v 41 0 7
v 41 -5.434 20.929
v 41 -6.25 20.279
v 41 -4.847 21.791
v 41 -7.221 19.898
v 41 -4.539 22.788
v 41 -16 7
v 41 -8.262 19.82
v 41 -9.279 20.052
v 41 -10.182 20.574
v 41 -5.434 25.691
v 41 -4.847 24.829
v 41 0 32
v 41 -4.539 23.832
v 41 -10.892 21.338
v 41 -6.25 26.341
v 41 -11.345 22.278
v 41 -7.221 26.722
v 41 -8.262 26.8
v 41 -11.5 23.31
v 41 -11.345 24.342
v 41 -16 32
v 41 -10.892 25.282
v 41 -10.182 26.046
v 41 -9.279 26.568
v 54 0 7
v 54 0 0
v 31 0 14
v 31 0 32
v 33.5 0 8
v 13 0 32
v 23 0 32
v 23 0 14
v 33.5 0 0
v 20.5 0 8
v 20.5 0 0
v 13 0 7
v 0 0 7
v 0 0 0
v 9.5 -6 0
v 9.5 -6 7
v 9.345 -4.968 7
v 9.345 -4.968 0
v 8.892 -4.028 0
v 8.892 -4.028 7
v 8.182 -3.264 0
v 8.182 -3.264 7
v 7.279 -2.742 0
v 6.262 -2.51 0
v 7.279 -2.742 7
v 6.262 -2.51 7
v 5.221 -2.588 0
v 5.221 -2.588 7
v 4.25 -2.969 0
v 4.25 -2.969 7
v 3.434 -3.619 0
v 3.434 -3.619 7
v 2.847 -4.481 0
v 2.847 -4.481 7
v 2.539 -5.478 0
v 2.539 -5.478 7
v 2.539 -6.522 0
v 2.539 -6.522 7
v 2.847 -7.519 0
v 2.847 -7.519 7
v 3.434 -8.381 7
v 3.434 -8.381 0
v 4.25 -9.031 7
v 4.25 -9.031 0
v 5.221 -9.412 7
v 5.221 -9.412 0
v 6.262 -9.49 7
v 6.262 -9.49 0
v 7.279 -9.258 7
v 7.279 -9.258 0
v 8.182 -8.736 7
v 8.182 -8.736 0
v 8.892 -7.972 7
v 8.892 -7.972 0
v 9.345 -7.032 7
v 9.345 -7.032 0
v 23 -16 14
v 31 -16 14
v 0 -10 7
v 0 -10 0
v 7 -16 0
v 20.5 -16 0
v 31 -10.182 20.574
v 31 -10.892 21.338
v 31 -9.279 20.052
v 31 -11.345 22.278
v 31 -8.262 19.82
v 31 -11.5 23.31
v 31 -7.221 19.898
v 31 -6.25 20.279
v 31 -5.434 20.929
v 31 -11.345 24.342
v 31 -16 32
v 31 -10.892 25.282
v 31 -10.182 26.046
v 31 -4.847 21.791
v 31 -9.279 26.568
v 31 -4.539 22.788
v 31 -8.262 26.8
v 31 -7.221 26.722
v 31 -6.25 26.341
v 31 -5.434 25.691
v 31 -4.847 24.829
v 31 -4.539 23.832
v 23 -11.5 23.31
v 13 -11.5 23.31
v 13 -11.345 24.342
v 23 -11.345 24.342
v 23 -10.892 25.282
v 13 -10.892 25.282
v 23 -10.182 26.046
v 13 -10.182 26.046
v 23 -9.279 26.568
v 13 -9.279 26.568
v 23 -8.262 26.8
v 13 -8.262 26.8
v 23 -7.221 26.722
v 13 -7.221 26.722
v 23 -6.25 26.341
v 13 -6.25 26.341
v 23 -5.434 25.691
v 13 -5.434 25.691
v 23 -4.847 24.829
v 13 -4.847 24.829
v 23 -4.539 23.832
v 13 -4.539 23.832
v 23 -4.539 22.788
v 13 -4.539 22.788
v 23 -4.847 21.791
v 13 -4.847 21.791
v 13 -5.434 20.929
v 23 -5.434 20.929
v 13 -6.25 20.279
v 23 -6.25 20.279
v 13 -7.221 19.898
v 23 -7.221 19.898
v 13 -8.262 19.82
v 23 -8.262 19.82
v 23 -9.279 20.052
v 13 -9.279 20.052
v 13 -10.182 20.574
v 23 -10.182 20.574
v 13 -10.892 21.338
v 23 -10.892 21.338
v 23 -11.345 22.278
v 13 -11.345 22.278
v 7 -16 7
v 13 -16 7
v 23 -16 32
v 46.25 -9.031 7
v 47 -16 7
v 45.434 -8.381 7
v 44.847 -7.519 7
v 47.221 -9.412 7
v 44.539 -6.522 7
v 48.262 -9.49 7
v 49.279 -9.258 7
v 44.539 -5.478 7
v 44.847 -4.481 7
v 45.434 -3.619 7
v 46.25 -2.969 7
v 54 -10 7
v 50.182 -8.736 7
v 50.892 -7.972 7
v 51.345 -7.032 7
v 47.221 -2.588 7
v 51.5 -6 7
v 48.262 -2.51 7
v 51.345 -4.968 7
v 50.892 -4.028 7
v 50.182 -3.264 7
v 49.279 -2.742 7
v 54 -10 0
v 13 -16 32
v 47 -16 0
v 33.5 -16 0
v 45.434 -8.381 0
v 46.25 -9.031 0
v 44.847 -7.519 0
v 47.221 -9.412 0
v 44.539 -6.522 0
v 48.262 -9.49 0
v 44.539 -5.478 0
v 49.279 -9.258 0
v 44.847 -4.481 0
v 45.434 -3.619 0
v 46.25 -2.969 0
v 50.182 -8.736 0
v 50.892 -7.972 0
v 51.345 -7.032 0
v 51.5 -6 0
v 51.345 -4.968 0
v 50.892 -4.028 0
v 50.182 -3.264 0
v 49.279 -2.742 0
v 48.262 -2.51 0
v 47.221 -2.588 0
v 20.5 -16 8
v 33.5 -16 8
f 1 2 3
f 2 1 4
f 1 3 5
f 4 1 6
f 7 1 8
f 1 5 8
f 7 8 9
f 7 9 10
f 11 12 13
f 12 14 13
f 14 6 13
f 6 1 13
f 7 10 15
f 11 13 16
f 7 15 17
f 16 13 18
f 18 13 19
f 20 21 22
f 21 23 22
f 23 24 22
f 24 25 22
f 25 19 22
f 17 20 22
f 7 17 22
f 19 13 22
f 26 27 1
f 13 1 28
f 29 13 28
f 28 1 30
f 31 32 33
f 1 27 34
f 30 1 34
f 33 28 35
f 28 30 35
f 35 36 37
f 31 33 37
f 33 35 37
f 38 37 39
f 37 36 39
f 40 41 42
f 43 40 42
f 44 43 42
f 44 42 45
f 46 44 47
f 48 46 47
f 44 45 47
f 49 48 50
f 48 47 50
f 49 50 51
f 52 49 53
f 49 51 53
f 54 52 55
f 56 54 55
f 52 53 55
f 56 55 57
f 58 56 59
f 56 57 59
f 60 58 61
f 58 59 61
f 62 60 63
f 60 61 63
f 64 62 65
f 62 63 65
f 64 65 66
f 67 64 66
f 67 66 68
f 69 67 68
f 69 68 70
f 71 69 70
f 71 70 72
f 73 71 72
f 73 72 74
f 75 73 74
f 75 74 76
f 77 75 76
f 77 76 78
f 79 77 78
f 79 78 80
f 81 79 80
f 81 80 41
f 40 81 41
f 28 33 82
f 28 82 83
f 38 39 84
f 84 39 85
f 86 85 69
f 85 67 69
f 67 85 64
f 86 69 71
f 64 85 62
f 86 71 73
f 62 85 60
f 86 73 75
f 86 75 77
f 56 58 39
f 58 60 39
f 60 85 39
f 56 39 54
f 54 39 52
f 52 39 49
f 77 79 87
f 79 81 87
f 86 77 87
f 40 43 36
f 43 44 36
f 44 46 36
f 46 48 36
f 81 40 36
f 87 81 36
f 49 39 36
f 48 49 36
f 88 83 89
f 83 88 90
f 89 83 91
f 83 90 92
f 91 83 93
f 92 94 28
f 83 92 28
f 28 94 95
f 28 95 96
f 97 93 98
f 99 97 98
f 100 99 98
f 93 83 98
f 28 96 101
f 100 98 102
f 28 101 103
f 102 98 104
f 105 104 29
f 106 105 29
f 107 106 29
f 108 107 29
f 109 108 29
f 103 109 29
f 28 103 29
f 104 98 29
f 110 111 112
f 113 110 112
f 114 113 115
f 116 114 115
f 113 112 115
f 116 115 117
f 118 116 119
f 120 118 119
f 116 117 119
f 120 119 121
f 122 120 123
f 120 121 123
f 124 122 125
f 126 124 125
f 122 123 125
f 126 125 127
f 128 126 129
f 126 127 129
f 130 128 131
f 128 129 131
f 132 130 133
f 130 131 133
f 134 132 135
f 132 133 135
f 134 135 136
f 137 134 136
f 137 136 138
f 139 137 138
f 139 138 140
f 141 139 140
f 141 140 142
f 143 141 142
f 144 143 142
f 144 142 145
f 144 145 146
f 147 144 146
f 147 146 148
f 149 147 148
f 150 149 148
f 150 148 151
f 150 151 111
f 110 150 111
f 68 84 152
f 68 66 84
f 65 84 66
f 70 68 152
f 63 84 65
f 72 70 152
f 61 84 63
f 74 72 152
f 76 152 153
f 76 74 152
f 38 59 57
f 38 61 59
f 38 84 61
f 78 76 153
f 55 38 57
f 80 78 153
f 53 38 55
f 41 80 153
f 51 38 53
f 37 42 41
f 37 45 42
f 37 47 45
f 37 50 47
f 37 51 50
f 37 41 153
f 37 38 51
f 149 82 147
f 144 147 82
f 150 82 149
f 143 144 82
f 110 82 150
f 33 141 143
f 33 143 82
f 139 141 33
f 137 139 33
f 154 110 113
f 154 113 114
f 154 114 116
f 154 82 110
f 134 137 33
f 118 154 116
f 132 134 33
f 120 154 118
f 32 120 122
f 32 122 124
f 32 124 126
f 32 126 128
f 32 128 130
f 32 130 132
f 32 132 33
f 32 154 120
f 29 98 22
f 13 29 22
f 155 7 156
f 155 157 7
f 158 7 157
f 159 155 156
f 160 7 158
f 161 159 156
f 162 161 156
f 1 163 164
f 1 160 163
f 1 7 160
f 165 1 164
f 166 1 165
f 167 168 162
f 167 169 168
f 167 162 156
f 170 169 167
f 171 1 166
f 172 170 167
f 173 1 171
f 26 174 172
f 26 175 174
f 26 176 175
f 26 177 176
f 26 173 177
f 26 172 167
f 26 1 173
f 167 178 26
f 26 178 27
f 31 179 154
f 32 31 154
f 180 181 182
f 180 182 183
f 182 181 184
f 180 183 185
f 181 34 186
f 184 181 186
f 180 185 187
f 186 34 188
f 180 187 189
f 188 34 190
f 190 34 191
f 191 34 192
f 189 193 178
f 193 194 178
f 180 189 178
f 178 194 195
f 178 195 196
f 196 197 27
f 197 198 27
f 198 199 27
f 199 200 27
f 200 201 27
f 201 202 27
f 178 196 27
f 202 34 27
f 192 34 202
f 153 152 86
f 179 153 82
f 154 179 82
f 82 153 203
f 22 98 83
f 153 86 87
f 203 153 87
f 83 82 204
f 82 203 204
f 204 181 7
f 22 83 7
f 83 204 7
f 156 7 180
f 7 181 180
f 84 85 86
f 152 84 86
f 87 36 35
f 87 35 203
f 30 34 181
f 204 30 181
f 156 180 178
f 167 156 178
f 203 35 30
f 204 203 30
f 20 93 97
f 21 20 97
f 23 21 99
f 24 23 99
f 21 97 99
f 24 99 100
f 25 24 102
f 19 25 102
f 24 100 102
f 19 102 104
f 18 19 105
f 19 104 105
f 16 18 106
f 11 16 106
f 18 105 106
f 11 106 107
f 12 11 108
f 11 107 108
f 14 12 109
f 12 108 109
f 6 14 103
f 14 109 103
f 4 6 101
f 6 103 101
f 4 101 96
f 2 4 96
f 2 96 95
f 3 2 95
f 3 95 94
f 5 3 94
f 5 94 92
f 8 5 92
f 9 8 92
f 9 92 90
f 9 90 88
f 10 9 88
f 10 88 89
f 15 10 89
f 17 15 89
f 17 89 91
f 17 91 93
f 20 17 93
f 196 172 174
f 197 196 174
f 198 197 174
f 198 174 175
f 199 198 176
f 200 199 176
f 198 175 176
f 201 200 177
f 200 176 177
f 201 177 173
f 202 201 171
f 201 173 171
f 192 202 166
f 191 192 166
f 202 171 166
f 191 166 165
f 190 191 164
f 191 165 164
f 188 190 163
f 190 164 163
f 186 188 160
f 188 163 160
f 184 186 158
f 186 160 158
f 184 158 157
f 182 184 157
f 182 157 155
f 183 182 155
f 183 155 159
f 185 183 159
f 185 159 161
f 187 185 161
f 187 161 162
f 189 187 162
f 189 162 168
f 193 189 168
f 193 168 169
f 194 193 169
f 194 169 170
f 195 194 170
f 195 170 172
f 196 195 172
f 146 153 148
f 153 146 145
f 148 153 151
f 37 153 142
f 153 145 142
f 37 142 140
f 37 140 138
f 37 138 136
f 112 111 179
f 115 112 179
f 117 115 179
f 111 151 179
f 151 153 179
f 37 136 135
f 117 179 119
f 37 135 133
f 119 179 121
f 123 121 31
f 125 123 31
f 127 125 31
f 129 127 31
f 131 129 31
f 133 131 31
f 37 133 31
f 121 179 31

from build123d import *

# Parameters (mm, degrees)
PAD_DEPTH       = 32
SKETCH001_W     = 13
SKETCH001_H     = 16
POCKET_DEPTH    = 8
POCKET001_DEPTH = 25
POCKET002_DEPTH = 25
SKETCH004_W     = 8
SKETCH004_H     = 16
POCKET003_DEPTH = 18
SKETCH005_R     = 3.5
POCKET004_DEPTH = 8
SKETCH006_R     = 3.5
POCKET005_DEPTH = 30


with BuildPart() as part:
    # Sketch → Pad (new body)
    with BuildSketch(Plane.XY):
        Polygon((0, 0), (0, -10), (7, -16), (47, -16), (54, -10), (54, 0), align=None)
    extrude(amount=PAD_DEPTH)

    # Sketch001 (on Face7 of Pad) → Pocket (cut)
    with BuildSketch(Plane(origin=(0, 0, 0), x_dir=(1, 0, 0), z_dir=(0, 0, -1))):
        with Locations((27, 8)):
            Rectangle(SKETCH001_W, SKETCH001_H)
    extrude(amount=-POCKET_DEPTH, mode=Mode.SUBTRACT)

    # Sketch002 (on Face5 of Pocket) → Pocket001 (cut)
    with BuildSketch(Plane.XY.offset(32)):
        Polygon((0, 0), (0, -10), (7, -16), (13, -16), (13, 0), align=None)
    extrude(amount=-POCKET001_DEPTH, mode=Mode.SUBTRACT)

    # Sketch003 (on Face12 of Pocket001) → Pocket002 (cut)
    with BuildSketch(Plane.XY.offset(32)):
        Polygon((54, 0), (41, 0), (41, -16), (47, -16), (54, -10), align=None)
    extrude(amount=-POCKET002_DEPTH, mode=Mode.SUBTRACT)

    # Sketch004 (on Face12 of Pocket002) → Pocket003 (cut)
    with BuildSketch(Plane.XY.offset(32)):
        with Locations((27, -8)):
            Rectangle(SKETCH004_W, SKETCH004_H)
    extrude(amount=-POCKET003_DEPTH, mode=Mode.SUBTRACT)

    # Sketch005 (on Face4 of Pocket003) → Pocket004 (cut)
    with BuildSketch(Plane.XY.offset(7)):
        with Locations((6, -6)):
            Circle(SKETCH005_R)
        with Locations((48, -6)):
            Circle(SKETCH005_R)
    extrude(amount=-POCKET004_DEPTH, mode=Mode.SUBTRACT)

    # Sketch006 (on Face9 of Pocket004) → Pocket005 (cut)
    with BuildSketch(Plane(origin=(13, 0, 0), x_dir=(0, -1, 0), z_dir=(-1, 0, 0))):
        with Locations((8, 23.31)):
            Circle(SKETCH006_R)
    extrude(amount=-POCKET005_DEPTH, mode=Mode.SUBTRACT)


solid = part.part
